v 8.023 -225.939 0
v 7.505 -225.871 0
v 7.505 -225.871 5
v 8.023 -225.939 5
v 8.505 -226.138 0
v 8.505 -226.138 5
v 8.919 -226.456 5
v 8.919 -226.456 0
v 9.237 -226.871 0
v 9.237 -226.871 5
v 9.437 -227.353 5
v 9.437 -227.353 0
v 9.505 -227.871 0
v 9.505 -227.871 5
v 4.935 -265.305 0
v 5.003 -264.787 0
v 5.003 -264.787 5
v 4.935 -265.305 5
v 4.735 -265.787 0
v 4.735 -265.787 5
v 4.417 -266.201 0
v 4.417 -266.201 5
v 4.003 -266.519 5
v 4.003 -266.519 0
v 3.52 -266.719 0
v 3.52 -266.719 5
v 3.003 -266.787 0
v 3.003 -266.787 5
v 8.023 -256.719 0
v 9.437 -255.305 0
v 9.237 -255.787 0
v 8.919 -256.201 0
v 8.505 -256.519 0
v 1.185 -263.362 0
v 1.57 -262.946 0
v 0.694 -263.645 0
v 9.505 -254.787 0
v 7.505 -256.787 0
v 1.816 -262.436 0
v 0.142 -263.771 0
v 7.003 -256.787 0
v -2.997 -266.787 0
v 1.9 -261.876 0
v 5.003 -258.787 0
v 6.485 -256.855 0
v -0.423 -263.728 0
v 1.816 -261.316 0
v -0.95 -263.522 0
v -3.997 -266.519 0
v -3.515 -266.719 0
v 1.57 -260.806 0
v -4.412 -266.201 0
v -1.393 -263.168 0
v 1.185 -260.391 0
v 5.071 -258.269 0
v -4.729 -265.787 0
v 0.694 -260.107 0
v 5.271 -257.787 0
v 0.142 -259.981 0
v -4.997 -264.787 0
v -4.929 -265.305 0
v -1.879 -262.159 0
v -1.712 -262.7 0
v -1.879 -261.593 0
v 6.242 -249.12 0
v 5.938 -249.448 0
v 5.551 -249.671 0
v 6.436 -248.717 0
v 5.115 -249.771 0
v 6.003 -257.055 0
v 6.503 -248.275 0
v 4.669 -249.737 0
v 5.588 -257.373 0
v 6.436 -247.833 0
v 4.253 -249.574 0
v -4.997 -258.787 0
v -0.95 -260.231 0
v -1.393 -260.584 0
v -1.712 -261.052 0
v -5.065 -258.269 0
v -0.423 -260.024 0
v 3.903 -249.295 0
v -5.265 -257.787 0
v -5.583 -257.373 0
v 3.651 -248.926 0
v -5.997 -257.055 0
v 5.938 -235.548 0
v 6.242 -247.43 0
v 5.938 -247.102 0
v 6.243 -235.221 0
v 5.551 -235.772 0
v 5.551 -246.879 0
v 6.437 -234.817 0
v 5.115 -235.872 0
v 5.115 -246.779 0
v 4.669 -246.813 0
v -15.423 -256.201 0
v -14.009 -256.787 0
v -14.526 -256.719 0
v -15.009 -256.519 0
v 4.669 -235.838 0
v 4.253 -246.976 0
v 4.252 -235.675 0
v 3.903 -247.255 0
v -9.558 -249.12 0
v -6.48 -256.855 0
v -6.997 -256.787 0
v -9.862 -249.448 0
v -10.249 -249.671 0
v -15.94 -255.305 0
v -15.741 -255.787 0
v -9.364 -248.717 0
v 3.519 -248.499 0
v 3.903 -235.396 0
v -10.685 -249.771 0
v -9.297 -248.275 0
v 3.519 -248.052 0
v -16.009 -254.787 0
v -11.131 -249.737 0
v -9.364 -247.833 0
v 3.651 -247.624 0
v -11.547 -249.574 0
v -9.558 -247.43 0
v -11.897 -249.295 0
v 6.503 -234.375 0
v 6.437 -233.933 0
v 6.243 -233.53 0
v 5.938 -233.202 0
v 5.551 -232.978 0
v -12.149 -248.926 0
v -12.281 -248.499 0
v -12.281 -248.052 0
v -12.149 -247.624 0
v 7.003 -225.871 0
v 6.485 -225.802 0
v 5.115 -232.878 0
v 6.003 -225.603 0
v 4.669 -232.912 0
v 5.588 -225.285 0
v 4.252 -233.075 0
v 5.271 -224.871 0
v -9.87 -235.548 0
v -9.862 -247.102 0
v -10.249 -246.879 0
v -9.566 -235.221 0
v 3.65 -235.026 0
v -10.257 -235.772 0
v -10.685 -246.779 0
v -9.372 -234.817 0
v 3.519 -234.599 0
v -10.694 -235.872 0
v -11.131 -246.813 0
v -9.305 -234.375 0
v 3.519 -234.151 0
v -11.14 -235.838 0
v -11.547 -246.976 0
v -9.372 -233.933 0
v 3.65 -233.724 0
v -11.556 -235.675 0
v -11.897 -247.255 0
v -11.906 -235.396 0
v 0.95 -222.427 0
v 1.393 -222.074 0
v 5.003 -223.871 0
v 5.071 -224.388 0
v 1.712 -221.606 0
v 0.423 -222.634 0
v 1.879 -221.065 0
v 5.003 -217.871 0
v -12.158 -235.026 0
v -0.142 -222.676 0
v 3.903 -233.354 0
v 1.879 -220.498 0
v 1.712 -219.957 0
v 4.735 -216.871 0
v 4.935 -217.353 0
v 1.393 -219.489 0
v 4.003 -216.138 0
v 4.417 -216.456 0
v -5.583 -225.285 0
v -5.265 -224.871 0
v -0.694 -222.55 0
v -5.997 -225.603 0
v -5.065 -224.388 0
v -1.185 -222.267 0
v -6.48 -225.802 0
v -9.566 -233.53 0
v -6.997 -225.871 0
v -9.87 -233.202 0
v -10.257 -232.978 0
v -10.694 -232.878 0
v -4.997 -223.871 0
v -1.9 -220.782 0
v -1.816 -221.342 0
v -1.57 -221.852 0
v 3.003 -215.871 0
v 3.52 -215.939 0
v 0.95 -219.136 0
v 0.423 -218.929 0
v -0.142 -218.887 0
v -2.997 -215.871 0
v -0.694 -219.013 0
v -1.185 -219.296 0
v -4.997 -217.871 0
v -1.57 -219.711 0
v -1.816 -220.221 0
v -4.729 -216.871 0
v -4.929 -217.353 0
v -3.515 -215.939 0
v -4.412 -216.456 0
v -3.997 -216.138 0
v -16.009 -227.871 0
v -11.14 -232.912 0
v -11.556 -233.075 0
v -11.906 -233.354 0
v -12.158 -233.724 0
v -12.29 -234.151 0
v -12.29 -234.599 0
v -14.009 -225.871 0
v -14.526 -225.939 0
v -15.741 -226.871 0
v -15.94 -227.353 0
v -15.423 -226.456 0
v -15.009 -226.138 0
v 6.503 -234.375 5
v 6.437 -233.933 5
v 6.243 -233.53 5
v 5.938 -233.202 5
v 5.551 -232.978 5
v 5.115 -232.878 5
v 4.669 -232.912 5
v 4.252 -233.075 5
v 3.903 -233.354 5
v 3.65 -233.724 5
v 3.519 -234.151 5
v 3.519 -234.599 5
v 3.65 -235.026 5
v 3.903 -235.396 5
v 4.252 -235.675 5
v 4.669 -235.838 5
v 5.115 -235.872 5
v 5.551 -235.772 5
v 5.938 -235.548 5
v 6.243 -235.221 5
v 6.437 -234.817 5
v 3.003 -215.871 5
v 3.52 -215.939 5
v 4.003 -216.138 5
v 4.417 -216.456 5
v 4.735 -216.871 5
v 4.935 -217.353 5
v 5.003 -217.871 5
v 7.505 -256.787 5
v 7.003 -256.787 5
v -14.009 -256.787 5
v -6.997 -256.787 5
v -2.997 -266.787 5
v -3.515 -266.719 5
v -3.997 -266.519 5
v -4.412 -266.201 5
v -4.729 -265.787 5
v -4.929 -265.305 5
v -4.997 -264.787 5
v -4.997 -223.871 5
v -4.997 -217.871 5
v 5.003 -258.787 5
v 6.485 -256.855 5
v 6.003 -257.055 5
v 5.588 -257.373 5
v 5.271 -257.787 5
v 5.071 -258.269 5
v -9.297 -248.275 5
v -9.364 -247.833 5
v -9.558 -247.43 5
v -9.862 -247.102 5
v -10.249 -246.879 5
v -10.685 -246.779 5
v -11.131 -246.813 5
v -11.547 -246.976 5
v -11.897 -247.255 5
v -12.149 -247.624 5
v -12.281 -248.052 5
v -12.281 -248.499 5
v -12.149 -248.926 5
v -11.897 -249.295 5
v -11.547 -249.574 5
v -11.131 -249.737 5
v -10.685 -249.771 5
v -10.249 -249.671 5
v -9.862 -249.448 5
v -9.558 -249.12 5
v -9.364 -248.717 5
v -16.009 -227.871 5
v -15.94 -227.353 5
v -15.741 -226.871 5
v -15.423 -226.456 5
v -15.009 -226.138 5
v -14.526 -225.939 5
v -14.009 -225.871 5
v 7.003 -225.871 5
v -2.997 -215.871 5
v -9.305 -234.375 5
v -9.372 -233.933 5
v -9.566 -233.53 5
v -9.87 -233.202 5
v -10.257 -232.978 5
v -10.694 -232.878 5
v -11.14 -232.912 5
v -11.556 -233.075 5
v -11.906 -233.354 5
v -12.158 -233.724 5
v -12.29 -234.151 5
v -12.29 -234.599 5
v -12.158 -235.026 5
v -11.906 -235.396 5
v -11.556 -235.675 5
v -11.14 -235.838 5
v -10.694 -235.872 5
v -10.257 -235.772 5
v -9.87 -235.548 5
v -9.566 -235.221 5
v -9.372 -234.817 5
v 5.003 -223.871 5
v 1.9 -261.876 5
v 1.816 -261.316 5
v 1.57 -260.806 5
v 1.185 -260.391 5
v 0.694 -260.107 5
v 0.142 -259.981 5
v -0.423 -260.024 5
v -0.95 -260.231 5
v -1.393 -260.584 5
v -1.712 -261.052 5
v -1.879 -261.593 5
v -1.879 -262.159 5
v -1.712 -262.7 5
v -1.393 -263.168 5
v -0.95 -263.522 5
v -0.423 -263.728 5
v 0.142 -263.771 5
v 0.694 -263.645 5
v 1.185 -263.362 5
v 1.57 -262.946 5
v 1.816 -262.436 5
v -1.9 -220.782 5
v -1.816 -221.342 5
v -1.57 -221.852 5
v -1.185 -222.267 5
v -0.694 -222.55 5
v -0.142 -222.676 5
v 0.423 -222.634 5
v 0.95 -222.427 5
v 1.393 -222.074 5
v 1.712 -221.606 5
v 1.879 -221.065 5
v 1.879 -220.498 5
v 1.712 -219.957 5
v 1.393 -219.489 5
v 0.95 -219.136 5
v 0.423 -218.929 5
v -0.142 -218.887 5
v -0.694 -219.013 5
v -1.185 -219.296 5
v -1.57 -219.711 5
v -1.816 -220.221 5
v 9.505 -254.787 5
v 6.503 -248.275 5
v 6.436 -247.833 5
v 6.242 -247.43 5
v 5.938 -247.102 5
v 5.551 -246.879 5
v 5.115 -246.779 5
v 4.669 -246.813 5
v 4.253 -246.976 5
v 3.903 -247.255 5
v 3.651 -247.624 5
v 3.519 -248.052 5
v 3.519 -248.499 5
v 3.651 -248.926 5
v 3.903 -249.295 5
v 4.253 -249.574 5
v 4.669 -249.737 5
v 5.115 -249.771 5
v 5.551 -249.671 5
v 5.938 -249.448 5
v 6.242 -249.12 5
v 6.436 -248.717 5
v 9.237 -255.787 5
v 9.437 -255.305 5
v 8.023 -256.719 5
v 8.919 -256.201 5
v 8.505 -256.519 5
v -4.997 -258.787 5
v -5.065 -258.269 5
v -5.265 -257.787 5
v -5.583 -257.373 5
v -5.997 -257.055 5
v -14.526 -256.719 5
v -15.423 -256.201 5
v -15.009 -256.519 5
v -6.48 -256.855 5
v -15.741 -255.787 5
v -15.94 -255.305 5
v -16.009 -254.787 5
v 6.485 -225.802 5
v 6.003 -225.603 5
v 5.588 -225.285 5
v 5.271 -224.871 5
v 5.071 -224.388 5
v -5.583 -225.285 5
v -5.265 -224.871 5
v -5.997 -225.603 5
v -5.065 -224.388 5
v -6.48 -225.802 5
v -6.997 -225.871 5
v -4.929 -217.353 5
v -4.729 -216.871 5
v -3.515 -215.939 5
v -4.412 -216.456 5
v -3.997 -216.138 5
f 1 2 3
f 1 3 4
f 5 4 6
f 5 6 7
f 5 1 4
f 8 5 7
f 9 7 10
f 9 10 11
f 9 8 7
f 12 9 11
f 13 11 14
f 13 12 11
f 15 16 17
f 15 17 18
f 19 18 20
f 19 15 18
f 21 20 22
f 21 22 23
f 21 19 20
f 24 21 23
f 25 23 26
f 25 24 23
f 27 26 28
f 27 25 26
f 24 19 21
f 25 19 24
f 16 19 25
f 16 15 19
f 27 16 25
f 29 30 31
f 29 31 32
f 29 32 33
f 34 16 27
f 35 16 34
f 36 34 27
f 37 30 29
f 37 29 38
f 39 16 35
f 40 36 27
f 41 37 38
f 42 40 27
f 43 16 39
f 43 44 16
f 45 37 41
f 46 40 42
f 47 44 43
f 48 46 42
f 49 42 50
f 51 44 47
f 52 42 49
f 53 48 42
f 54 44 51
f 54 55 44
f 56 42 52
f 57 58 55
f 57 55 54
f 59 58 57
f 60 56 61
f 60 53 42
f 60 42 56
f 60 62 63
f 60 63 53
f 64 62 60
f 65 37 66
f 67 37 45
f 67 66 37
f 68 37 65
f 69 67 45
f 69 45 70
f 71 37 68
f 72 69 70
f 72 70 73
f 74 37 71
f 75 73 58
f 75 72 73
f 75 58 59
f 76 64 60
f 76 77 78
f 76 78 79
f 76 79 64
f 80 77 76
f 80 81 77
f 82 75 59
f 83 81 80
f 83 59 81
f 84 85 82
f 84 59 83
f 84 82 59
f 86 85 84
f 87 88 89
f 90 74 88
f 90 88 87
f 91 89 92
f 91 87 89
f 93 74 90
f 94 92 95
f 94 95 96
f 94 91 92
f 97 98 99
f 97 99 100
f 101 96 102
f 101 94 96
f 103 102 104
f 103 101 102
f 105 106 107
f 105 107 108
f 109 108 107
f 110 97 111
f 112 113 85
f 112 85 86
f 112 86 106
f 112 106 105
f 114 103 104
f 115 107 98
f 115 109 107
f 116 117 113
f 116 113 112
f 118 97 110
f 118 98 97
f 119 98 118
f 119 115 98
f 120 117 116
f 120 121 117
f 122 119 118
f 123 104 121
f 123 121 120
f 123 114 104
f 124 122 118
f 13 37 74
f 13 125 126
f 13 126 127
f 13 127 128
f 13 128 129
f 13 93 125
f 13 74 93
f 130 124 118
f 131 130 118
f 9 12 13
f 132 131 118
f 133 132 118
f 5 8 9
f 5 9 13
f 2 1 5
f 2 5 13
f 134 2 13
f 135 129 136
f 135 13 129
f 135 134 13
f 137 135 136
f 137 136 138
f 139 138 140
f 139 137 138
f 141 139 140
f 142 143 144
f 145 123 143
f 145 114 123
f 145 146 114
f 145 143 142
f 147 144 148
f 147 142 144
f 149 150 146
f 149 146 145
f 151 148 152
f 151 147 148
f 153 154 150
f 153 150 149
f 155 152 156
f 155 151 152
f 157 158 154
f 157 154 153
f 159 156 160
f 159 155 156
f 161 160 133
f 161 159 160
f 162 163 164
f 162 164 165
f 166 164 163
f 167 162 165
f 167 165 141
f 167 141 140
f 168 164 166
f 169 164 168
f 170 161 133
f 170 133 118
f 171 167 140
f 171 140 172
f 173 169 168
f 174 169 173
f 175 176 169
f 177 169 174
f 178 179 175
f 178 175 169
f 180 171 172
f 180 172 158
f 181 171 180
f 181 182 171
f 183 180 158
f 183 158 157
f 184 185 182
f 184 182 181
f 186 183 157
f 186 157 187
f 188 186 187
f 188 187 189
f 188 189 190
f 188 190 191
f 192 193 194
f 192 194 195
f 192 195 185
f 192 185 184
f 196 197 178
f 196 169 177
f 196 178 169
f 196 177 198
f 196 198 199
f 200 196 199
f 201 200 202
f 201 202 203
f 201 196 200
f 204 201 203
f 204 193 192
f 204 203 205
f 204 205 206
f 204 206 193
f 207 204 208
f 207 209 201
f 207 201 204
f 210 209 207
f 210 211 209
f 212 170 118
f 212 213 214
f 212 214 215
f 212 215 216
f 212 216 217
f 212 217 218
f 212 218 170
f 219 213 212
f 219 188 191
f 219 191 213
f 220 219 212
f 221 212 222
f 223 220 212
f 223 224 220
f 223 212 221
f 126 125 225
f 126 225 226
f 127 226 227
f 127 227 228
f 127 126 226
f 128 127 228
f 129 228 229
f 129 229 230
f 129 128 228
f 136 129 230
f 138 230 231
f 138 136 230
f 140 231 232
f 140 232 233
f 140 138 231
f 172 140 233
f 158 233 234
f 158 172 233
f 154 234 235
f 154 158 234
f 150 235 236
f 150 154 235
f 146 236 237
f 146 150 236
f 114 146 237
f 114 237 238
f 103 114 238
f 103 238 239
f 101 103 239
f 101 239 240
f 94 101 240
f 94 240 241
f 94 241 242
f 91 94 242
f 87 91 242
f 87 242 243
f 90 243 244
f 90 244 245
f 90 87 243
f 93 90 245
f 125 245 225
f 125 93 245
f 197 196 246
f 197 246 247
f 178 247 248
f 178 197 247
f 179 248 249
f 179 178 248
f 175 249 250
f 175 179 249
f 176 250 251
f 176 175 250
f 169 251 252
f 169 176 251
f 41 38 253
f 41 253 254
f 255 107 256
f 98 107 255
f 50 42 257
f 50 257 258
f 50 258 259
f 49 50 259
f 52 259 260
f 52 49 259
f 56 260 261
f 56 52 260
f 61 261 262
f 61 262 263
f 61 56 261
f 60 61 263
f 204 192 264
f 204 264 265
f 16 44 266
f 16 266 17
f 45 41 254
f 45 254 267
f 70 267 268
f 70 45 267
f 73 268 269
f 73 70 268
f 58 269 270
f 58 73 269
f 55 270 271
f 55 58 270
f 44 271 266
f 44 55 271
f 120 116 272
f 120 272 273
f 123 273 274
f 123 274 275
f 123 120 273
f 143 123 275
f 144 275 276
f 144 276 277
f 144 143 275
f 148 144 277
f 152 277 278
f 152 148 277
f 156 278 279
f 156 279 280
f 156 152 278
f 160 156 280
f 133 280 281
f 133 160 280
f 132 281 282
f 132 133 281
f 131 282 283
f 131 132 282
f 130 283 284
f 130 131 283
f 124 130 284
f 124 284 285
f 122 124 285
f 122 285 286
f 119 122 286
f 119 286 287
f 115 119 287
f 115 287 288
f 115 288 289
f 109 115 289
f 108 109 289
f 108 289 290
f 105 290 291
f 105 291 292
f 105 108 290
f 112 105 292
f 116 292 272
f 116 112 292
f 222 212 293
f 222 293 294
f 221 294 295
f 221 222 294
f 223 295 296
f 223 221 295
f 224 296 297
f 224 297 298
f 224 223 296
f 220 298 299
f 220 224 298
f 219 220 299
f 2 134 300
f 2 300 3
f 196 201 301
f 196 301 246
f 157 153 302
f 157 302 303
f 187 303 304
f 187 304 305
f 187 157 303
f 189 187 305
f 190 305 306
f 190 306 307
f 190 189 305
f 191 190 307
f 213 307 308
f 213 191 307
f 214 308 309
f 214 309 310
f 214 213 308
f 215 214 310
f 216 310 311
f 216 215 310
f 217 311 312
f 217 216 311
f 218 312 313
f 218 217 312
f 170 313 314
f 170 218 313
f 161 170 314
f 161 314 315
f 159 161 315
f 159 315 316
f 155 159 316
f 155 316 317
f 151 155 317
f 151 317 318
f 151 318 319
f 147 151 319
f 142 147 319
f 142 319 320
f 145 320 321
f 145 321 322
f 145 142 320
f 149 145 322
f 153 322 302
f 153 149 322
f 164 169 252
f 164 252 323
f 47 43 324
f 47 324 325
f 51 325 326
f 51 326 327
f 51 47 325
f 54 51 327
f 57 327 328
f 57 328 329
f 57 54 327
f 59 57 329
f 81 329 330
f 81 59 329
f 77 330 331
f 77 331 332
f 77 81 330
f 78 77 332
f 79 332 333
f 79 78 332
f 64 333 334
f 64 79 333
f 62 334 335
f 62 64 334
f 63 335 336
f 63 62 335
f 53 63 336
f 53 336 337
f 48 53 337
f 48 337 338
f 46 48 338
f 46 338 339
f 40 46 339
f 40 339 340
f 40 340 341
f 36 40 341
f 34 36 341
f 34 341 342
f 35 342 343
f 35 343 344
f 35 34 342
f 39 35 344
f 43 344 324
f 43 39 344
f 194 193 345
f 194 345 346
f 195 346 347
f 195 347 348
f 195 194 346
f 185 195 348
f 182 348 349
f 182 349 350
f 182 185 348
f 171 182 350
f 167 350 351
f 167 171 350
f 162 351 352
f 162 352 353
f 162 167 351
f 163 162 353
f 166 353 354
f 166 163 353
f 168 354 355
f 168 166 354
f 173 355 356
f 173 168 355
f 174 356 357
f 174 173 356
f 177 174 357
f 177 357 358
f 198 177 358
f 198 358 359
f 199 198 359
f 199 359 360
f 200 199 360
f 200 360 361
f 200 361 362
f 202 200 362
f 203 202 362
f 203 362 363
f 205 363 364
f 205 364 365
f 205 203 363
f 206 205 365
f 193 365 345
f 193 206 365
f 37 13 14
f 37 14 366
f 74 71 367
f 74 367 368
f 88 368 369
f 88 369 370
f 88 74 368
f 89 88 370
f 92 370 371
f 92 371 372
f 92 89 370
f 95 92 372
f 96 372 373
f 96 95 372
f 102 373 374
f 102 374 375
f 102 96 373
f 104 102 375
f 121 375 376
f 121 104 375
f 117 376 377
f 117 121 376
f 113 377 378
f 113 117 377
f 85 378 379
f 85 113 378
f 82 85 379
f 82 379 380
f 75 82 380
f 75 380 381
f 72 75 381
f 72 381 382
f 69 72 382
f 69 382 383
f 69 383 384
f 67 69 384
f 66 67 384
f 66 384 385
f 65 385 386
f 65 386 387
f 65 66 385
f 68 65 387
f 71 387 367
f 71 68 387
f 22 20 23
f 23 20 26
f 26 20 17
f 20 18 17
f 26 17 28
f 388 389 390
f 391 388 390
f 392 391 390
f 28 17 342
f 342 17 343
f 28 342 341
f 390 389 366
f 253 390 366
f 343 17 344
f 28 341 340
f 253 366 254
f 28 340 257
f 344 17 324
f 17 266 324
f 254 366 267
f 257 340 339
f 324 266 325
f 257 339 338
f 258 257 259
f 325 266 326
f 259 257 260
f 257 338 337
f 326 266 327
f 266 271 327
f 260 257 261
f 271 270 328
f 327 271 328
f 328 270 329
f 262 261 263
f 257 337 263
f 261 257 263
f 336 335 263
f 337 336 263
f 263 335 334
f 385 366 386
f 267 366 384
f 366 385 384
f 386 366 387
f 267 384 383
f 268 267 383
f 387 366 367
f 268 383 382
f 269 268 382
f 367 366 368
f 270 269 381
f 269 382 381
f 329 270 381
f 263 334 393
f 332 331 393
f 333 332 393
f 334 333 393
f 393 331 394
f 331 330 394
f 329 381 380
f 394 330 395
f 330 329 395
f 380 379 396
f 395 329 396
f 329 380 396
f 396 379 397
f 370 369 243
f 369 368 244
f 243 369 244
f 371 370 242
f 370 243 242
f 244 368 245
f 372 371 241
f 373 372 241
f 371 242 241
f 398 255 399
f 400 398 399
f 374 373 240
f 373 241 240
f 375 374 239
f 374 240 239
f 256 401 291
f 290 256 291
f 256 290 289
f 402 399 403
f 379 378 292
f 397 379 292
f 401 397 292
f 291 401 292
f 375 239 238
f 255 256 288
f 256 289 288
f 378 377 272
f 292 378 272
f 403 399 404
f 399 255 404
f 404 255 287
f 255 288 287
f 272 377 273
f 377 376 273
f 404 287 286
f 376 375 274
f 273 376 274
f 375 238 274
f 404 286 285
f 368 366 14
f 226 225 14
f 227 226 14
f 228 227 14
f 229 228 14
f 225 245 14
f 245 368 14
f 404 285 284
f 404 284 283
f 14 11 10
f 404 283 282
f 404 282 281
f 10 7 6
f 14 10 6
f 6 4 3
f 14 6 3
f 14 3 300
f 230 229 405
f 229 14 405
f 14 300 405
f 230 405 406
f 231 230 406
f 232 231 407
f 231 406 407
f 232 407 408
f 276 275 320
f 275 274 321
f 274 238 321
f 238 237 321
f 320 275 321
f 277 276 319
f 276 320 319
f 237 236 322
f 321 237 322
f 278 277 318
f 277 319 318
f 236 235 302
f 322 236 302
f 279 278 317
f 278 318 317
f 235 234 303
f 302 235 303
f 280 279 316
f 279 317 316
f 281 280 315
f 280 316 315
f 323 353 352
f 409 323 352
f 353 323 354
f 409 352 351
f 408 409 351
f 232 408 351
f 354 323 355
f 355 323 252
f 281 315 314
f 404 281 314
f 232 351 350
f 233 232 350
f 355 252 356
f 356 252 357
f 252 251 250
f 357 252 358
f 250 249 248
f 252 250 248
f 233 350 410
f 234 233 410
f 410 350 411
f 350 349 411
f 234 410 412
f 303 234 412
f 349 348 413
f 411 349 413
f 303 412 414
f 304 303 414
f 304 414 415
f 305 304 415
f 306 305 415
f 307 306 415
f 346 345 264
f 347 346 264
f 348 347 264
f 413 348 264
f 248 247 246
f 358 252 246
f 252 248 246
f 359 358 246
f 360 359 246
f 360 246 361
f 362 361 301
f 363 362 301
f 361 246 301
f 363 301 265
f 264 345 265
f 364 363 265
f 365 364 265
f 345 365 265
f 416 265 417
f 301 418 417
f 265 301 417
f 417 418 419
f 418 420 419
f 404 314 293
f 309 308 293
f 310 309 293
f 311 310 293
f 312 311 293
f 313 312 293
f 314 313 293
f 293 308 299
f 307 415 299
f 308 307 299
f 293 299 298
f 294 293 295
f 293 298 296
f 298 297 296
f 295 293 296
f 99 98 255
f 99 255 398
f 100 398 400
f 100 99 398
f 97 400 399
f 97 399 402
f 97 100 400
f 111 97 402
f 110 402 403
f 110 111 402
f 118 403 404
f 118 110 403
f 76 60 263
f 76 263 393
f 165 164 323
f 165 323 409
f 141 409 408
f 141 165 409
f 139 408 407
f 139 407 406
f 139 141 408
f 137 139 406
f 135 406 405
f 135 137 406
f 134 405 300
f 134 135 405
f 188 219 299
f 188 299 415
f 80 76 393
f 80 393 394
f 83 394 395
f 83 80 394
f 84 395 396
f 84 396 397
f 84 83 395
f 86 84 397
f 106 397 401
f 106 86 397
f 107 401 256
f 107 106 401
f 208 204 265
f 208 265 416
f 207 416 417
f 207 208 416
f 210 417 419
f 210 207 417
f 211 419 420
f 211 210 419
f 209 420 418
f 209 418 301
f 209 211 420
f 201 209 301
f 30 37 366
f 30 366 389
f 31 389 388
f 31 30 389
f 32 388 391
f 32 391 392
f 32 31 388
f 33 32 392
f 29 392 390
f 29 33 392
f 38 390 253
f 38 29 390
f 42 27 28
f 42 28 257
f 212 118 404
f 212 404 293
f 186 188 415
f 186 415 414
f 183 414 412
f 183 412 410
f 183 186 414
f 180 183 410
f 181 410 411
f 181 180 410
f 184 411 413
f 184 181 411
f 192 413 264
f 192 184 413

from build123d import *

# Parameters (mm, degrees)
SKETCH1_R           = 1.9
SKETCH1_R_2         = 1.500800978
SKETCH1_R_3         = 1.5
BOSS_EXTRUDE1_DEPTH = 5


with BuildPart() as part:
    # Sketch1 → Boss-Extrude1 (new body)
    with BuildSketch(Plane.XY):
        with BuildLine():
            Line((-6.997330295, -256.787047369), (-14.00854399, -256.787047369))
            ThreePointArc((-14.00854399, -256.787047369), (-15.422757553, -256.201260932), (-16.00854399, -254.787047369))
            Line((-16.00854399, -254.787047369), (-16.00854399, -227.870547218))
            ThreePointArc((-16.00854399, -227.870547218), (-15.422757553, -226.456333656), (-14.00854399, -225.870547218))
            Line((-14.00854399, -225.870547218), (-6.997330295, -225.870547218))
            ThreePointArc((-6.997330295, -225.870547218), (-5.583116733, -225.284760781), (-4.997330295, -223.870547218))
            Line((-4.997330295, -223.870547218), (-4.997330295, -217.870547218))
            ThreePointArc((-4.997330295, -217.870547218), (-4.411543858, -216.456333656), (-2.997330295, -215.870547218))
            Line((-2.997330295, -215.870547218), (3.002669705, -215.870547218))
            ThreePointArc((3.002669705, -215.870547218), (4.416883267, -216.456333656), (5.002669705, -217.870547218))
            Line((5.002669705, -217.870547218), (5.002669705, -223.870547218))
            ThreePointArc((5.002669705, -223.870547218), (5.588456142, -225.284760781), (7.002669705, -225.870547218))
            Line((7.002669705, -225.870547218), (7.505072862, -225.870547218))
            ThreePointArc((7.505072862, -225.870547218), (8.919286424, -226.456333656), (9.505072862, -227.870547218))
            Line((9.505072862, -227.870547218), (9.505072862, -254.787047369))
            ThreePointArc((9.505072862, -254.787047369), (8.919286424, -256.201260932), (7.505072862, -256.787047369))
            Line((7.505072862, -256.787047369), (7.002669705, -256.787047369))
            ThreePointArc((7.002669705, -256.787047369), (5.588456142, -257.372833807), (5.002669705, -258.787047369))
            Line((5.002669705, -258.787047369), (5.002669705, -264.787047369))
            ThreePointArc((5.002669705, -264.787047369), (4.416883267, -266.201260932), (3.002669705, -266.787047369))
            Line((3.002669705, -266.787047369), (-2.997330295, -266.787047369))
            ThreePointArc((-2.997330295, -266.787047369), (-4.411543858, -266.201260932), (-4.997330295, -264.787047369))
            Line((-4.997330295, -264.787047369), (-4.997330295, -258.787047369))
            ThreePointArc((-4.997330295, -258.787047369), (-5.583116733, -257.372833807), (-6.997330295, -256.787047369))
        make_face()
        with Locations((0, -261.876090751)):
            Circle(SKETCH1_R, mode=Mode.SUBTRACT)
        with Locations((5.002669705, -234.375086095)):
            Circle(SKETCH1_R_2, mode=Mode.SUBTRACT)
        with Locations((-10.805767266, -234.375086095)):
            Circle(SKETCH1_R_2, mode=Mode.SUBTRACT)
        with Locations(Location((0, -220.781503837, 0), (0, 0, 180))):
            Circle(SKETCH1_R, mode=Mode.SUBTRACT)
        with Locations((5.002669705, -248.275086095)):
            Circle(SKETCH1_R_3, mode=Mode.SUBTRACT)
        with Locations((-10.797330295, -248.275086095)):
            Circle(SKETCH1_R_3, mode=Mode.SUBTRACT)
    extrude(amount=BOSS_EXTRUDE1_DEPTH)


solid = part.part
